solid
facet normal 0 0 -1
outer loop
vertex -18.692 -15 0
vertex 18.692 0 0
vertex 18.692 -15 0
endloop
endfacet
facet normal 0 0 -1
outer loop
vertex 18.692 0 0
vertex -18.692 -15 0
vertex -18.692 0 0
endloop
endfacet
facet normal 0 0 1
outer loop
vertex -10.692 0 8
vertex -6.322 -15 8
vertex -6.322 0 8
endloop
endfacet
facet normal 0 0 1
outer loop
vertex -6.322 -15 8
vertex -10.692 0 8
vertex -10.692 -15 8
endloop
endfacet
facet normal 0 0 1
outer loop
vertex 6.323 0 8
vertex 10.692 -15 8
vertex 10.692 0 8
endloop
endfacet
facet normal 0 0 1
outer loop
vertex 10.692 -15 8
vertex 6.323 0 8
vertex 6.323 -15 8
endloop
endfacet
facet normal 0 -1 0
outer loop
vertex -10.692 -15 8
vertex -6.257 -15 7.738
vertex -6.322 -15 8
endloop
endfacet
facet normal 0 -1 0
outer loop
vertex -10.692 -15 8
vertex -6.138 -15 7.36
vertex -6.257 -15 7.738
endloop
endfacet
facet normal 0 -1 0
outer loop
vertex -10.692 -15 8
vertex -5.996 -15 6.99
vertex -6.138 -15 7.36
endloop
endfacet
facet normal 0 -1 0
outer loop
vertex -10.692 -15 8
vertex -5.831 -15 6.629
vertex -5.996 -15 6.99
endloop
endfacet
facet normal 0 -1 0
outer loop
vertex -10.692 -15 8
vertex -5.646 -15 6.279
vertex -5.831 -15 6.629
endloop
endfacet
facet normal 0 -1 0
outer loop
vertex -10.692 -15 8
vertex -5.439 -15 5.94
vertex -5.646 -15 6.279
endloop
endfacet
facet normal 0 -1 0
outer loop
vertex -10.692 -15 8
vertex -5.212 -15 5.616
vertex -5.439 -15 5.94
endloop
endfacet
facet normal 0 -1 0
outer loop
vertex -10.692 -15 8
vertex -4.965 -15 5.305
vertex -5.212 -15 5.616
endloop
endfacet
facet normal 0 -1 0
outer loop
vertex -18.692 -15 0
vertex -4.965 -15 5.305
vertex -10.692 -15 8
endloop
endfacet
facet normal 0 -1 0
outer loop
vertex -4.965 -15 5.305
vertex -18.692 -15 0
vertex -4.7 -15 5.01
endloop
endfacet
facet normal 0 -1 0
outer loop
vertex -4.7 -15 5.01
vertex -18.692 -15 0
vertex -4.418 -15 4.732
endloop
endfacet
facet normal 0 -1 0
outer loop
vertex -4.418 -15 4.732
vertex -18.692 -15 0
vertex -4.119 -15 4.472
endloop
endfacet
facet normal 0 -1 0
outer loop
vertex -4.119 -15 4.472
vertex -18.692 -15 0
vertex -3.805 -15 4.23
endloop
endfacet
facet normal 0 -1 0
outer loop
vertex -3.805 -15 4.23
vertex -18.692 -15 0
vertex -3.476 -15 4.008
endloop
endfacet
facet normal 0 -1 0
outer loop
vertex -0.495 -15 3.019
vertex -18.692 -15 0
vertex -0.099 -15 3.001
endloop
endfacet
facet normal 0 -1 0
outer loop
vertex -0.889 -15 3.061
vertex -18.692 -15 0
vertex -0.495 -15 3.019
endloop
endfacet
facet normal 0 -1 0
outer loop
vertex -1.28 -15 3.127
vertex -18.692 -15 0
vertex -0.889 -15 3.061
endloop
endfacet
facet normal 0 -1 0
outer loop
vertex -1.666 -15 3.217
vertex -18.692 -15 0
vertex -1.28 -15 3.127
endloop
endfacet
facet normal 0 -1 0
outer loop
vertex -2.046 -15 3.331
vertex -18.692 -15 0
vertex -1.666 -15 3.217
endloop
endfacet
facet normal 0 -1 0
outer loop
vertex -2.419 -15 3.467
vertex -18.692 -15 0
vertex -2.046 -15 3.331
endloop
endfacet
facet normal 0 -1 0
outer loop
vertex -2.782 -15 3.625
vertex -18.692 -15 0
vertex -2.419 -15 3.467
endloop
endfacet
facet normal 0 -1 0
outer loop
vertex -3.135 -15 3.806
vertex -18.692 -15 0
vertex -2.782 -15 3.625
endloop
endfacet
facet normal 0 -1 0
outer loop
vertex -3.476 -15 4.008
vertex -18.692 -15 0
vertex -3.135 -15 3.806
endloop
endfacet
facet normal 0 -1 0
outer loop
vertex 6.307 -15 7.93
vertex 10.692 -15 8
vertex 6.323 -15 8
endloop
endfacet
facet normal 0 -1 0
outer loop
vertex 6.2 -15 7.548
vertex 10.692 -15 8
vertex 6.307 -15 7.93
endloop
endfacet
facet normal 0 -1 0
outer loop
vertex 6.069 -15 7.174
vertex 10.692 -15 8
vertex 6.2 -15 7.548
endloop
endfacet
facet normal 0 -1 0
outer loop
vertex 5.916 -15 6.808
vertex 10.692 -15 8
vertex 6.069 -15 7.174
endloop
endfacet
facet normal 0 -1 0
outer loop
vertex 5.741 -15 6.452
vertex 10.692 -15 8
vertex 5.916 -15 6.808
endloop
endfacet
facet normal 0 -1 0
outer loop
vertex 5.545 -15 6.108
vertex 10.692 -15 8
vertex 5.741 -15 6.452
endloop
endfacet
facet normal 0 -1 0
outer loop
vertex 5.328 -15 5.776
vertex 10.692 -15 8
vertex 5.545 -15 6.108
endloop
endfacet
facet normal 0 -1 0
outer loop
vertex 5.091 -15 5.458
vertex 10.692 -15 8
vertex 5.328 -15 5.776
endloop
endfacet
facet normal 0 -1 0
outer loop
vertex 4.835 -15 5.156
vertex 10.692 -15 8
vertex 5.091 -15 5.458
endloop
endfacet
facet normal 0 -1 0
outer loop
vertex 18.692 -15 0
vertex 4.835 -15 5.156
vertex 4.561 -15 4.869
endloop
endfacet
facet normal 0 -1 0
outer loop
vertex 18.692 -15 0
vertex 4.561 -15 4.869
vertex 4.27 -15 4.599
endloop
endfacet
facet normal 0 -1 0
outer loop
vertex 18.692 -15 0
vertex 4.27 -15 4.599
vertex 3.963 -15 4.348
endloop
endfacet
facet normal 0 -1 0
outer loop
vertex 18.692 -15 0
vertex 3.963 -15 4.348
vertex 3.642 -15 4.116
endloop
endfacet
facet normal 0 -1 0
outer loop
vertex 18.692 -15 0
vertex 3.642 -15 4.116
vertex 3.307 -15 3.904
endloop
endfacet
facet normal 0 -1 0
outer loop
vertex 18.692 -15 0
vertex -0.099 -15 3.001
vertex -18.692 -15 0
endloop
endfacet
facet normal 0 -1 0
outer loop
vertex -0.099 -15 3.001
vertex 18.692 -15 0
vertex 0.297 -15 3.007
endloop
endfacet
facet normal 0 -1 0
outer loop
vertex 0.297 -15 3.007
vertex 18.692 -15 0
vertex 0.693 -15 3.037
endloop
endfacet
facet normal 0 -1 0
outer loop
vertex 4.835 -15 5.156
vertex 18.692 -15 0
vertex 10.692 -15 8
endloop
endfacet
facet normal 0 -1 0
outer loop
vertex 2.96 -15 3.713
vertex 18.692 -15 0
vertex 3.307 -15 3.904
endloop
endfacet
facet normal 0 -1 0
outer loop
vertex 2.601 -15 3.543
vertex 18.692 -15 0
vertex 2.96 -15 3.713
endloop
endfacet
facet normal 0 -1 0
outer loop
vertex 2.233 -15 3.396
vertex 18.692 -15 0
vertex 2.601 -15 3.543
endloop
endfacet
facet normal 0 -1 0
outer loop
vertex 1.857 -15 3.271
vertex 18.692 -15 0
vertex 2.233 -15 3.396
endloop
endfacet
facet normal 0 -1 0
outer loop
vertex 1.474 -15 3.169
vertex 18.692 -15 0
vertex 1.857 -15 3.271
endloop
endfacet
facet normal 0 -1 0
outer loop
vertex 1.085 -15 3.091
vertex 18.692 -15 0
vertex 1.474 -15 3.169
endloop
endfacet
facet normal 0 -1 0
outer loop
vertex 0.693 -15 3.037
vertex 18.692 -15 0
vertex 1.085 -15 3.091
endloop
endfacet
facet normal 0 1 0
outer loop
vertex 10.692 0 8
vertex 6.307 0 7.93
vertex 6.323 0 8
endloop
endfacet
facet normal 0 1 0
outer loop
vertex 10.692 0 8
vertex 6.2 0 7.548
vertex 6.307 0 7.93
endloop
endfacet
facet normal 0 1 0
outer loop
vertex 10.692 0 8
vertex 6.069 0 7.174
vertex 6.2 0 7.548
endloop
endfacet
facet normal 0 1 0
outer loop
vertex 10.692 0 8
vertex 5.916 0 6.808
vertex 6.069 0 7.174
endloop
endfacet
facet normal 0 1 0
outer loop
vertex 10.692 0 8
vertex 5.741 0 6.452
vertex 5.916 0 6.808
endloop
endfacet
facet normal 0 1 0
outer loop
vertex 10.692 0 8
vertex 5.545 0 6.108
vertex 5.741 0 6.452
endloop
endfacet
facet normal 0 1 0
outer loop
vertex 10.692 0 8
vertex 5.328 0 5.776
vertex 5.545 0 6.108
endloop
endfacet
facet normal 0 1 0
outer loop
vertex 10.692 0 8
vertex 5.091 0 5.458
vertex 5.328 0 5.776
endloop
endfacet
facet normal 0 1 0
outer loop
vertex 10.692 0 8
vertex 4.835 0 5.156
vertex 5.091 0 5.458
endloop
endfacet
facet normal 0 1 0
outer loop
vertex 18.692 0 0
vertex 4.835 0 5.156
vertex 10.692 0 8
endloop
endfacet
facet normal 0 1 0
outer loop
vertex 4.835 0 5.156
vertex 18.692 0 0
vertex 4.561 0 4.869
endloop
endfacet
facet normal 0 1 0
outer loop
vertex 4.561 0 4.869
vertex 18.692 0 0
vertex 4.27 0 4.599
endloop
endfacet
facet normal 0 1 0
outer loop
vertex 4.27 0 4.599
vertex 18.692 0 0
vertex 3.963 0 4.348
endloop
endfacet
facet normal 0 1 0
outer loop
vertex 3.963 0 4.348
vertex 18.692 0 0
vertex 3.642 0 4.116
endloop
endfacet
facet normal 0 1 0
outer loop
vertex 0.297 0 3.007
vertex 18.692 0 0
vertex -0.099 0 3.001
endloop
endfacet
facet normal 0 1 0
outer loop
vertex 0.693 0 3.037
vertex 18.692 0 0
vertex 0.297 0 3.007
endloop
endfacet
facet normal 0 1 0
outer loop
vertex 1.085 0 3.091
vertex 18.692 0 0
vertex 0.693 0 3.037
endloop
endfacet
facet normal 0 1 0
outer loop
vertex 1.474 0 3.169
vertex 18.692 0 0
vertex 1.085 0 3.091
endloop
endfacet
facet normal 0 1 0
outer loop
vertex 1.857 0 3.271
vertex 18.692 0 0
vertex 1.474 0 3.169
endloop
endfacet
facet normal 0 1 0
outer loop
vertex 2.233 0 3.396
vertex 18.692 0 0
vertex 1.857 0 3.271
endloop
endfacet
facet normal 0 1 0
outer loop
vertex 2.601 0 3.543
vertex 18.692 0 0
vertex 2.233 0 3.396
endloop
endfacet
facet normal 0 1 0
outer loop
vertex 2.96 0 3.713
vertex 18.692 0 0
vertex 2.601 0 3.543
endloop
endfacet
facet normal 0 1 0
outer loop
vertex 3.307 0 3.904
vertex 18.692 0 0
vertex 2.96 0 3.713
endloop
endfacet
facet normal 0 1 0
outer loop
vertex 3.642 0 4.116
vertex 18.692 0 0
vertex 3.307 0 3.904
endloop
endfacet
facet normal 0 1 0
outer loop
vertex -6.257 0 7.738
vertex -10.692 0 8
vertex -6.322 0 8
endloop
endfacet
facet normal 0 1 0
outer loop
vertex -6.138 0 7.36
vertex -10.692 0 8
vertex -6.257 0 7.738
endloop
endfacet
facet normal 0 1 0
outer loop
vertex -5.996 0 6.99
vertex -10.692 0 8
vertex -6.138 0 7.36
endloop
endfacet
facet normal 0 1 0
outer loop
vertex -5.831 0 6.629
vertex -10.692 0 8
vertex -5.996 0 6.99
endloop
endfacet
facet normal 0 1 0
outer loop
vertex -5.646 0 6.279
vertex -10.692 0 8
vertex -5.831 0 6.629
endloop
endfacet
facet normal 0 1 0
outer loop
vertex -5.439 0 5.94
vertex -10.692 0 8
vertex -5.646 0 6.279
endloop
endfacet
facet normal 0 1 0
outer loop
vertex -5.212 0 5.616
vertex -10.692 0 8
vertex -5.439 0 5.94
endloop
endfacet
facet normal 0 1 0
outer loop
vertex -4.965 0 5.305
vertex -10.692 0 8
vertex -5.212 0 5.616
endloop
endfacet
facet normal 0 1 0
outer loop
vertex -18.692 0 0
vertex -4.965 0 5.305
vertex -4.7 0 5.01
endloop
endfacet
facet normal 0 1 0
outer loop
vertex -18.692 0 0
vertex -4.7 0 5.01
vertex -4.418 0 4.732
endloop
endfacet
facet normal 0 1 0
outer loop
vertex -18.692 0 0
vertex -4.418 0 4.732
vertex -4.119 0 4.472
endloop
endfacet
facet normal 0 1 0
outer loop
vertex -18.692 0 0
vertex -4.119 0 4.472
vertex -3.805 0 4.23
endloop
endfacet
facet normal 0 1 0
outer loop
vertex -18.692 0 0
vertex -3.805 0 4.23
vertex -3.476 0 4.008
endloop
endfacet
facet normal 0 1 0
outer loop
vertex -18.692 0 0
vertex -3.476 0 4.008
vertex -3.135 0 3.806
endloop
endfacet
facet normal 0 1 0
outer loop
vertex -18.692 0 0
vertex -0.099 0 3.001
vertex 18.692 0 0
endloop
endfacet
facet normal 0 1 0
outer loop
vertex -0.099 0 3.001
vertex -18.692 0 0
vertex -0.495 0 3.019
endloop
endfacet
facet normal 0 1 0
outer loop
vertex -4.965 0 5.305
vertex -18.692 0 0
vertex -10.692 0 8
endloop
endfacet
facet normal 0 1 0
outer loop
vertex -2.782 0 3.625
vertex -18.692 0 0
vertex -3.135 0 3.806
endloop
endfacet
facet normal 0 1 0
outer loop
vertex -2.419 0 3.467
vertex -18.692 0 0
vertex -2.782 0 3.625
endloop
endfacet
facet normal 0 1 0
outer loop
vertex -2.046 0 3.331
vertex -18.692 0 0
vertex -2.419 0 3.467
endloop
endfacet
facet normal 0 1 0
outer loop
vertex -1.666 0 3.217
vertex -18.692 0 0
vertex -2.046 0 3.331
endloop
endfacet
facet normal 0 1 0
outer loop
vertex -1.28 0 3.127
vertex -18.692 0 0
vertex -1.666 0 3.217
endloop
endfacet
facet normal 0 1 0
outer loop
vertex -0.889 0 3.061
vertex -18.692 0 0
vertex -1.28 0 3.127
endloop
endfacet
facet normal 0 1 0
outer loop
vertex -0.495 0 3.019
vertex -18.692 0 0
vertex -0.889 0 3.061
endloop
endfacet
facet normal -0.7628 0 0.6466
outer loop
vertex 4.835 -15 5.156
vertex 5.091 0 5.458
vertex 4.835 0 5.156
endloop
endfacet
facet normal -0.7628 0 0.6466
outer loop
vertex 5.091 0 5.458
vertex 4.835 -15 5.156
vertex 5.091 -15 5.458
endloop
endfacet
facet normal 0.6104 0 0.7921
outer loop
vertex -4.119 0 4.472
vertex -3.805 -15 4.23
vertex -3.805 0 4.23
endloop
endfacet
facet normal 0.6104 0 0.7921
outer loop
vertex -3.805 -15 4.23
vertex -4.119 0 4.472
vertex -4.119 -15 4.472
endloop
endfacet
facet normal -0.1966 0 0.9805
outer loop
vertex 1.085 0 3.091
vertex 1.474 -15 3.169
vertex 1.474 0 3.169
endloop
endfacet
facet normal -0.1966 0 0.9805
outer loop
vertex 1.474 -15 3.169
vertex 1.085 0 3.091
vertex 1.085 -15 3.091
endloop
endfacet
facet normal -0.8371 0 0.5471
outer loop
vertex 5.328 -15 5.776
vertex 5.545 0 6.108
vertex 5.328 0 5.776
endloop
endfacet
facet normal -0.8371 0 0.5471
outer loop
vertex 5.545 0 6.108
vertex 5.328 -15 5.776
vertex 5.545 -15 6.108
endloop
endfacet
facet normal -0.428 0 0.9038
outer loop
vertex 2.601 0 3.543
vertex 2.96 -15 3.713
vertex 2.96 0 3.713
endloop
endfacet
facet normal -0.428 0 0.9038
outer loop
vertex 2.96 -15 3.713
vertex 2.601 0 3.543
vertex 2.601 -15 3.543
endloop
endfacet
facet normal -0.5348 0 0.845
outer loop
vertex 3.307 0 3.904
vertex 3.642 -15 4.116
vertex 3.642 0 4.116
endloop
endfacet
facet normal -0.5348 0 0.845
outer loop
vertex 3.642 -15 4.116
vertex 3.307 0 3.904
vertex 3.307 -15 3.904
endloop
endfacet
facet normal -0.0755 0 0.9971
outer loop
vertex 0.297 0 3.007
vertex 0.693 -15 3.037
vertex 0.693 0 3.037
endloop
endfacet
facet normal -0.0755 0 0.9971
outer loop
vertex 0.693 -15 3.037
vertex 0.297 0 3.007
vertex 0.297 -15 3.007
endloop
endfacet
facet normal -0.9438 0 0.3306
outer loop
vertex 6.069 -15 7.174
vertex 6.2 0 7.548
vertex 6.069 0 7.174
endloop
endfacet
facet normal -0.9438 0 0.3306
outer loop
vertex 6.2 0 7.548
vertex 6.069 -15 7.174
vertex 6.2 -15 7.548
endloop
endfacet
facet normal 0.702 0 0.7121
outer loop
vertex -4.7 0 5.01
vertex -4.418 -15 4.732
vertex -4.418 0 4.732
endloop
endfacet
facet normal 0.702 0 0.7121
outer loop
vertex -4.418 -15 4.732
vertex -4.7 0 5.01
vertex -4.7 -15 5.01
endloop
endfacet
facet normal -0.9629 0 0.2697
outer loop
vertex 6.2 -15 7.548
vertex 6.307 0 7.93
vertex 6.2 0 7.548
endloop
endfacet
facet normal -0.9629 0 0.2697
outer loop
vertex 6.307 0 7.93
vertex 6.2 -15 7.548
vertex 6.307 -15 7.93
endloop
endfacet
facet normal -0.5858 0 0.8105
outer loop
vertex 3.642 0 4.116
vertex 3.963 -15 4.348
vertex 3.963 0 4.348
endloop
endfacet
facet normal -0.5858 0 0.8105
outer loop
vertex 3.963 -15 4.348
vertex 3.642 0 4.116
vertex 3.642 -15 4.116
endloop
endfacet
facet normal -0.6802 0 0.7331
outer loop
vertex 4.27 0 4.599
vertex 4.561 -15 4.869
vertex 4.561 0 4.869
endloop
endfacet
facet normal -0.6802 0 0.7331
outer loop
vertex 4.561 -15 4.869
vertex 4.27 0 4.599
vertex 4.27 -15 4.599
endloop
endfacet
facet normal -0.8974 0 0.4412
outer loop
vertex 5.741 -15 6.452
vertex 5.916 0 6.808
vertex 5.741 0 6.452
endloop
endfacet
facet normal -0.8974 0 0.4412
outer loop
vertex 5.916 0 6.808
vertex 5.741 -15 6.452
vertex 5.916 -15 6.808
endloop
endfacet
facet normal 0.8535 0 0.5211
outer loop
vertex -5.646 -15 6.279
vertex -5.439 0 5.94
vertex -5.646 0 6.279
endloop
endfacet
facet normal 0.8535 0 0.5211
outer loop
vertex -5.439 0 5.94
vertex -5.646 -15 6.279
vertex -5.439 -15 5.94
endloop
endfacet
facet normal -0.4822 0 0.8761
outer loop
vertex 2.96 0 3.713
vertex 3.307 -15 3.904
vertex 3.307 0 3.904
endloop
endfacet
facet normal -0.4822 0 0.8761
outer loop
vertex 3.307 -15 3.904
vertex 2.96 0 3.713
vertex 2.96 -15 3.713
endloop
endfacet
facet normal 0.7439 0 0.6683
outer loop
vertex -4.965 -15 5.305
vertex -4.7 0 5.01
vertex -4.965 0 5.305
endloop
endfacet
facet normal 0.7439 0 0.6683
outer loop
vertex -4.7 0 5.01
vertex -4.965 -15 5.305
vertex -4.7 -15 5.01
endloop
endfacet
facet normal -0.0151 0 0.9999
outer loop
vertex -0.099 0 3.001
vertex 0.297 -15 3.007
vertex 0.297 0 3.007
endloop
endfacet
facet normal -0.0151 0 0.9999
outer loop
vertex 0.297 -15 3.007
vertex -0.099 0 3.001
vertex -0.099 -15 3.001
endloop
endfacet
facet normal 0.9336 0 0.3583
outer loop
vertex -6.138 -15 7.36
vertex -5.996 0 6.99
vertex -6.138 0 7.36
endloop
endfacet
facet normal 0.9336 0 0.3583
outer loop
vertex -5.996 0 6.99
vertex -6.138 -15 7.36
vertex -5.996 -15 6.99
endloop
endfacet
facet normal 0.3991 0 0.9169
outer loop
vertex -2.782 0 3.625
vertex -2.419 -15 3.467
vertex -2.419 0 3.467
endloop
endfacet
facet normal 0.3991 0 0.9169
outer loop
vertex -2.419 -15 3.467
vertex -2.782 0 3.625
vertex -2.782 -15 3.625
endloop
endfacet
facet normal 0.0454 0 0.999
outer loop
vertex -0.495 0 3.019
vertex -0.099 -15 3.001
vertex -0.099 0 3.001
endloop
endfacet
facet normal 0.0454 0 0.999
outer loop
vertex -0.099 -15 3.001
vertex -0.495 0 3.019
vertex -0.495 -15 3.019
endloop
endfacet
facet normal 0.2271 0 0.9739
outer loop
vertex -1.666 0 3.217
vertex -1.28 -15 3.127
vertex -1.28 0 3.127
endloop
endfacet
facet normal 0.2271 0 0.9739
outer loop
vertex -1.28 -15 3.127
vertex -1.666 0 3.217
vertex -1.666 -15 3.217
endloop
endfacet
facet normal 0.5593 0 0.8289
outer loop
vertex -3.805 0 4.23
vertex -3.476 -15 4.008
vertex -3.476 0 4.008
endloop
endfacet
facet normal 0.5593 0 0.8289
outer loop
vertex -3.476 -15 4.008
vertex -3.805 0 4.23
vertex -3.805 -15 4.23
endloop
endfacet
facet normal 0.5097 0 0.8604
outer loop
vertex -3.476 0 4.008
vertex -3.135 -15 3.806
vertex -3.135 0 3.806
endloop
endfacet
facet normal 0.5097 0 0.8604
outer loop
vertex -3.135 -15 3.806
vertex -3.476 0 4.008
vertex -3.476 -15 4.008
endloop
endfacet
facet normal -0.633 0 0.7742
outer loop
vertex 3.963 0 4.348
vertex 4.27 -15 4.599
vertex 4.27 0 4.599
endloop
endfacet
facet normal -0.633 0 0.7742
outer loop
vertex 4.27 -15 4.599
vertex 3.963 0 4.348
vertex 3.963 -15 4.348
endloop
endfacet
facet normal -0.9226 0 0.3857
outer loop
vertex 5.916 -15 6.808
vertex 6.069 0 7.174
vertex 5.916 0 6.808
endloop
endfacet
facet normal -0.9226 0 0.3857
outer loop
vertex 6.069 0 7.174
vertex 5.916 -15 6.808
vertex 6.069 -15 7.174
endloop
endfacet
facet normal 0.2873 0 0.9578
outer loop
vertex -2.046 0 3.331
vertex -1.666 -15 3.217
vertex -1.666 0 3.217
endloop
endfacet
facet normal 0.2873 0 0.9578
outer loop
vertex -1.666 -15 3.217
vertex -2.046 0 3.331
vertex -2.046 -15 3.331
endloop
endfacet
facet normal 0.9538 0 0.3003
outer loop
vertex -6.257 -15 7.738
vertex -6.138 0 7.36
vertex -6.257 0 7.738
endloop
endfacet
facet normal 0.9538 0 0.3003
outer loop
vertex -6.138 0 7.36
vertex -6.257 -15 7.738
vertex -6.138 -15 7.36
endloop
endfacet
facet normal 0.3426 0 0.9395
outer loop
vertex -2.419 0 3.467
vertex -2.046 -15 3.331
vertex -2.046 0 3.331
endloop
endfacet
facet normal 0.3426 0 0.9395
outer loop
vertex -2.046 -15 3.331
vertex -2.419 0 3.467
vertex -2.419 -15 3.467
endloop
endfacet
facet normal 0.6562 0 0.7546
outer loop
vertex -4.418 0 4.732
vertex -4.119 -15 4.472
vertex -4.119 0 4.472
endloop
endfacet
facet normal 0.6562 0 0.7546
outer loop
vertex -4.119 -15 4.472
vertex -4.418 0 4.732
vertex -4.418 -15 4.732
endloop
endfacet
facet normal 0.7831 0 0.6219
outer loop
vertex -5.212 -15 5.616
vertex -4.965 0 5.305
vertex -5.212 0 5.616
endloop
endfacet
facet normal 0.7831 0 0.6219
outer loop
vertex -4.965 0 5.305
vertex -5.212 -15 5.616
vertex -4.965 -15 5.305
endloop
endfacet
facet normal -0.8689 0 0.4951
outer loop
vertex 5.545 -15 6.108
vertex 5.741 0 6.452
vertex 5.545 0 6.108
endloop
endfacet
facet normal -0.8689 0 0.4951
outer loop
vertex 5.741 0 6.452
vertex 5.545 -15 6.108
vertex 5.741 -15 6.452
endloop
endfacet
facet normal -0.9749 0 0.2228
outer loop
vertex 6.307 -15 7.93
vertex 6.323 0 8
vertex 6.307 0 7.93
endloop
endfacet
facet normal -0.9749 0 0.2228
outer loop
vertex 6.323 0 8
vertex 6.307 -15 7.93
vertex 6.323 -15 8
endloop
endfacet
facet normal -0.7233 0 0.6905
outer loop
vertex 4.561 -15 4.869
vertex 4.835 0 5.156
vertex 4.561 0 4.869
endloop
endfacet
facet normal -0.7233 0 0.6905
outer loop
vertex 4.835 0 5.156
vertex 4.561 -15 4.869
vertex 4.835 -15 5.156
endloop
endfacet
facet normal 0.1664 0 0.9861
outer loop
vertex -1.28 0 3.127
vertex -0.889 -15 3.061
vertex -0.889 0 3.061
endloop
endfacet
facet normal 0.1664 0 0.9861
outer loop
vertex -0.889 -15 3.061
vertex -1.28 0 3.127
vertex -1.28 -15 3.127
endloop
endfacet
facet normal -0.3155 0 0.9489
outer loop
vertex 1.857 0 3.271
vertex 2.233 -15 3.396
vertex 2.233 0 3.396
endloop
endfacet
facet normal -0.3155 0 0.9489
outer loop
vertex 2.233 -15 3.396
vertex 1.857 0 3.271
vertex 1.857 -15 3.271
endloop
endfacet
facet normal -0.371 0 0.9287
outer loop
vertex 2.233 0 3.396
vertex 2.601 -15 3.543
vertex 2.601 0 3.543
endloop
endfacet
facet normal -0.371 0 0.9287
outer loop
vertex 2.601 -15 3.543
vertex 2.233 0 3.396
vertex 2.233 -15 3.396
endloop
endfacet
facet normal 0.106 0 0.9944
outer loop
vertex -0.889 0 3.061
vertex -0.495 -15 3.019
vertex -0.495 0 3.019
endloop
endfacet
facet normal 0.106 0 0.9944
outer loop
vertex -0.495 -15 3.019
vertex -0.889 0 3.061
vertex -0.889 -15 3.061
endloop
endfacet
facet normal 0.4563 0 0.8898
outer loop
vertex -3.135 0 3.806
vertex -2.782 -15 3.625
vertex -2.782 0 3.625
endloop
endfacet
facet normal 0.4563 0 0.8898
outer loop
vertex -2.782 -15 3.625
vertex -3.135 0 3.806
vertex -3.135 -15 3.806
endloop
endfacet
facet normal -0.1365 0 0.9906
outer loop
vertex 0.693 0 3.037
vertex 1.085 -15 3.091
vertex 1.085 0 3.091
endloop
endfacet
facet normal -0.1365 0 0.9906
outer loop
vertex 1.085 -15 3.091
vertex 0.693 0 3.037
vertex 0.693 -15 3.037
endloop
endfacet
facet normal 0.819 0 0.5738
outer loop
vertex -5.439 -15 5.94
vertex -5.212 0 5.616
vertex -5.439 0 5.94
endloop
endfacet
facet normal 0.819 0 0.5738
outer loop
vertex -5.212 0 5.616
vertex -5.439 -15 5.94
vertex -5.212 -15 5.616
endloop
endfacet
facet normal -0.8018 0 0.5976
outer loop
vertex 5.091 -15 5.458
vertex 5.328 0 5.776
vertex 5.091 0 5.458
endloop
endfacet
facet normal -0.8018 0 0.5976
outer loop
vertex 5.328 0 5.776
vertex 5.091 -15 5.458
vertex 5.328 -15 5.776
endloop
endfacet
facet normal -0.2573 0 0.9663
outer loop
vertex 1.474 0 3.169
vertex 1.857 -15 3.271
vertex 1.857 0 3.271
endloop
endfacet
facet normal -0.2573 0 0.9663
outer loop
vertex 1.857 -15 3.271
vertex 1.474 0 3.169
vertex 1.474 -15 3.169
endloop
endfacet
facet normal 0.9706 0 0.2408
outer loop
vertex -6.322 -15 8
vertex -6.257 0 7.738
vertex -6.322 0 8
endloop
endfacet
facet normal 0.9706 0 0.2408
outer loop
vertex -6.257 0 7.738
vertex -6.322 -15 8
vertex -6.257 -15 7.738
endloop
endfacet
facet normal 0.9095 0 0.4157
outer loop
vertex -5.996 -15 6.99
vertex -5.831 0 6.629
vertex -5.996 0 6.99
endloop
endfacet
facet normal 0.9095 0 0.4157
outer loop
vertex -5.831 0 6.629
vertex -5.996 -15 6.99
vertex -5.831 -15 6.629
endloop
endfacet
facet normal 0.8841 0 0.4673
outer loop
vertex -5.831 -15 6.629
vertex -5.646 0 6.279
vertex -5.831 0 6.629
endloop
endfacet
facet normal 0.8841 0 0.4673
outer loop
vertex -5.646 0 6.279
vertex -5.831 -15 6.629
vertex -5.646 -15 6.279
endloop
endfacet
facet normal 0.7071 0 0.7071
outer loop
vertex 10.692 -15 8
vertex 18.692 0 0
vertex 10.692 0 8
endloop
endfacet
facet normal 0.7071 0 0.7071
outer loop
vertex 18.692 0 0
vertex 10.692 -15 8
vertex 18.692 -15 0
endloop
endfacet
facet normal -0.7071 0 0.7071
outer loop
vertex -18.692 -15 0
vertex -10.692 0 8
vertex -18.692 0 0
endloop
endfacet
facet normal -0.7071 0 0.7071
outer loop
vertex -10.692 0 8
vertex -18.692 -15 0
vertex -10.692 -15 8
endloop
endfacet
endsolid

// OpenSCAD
$fa = 1.0;
$fs = 0.4;
translate([0,0,18.692]) rotate([180,0,0])
difference(){
    translate([-25,0,10.692]) cube([50,15,8]);
    translate([0,16,9.192]) rotate([90,0,0]) cylinder(r=6.5, h=17);
    rotate([0,45,0]) translate([0,-1,0]) cube([17,17,34]);
    rotate([0,-45,0]) translate([-17,-1,0]) cube([17,17,34]);
}
